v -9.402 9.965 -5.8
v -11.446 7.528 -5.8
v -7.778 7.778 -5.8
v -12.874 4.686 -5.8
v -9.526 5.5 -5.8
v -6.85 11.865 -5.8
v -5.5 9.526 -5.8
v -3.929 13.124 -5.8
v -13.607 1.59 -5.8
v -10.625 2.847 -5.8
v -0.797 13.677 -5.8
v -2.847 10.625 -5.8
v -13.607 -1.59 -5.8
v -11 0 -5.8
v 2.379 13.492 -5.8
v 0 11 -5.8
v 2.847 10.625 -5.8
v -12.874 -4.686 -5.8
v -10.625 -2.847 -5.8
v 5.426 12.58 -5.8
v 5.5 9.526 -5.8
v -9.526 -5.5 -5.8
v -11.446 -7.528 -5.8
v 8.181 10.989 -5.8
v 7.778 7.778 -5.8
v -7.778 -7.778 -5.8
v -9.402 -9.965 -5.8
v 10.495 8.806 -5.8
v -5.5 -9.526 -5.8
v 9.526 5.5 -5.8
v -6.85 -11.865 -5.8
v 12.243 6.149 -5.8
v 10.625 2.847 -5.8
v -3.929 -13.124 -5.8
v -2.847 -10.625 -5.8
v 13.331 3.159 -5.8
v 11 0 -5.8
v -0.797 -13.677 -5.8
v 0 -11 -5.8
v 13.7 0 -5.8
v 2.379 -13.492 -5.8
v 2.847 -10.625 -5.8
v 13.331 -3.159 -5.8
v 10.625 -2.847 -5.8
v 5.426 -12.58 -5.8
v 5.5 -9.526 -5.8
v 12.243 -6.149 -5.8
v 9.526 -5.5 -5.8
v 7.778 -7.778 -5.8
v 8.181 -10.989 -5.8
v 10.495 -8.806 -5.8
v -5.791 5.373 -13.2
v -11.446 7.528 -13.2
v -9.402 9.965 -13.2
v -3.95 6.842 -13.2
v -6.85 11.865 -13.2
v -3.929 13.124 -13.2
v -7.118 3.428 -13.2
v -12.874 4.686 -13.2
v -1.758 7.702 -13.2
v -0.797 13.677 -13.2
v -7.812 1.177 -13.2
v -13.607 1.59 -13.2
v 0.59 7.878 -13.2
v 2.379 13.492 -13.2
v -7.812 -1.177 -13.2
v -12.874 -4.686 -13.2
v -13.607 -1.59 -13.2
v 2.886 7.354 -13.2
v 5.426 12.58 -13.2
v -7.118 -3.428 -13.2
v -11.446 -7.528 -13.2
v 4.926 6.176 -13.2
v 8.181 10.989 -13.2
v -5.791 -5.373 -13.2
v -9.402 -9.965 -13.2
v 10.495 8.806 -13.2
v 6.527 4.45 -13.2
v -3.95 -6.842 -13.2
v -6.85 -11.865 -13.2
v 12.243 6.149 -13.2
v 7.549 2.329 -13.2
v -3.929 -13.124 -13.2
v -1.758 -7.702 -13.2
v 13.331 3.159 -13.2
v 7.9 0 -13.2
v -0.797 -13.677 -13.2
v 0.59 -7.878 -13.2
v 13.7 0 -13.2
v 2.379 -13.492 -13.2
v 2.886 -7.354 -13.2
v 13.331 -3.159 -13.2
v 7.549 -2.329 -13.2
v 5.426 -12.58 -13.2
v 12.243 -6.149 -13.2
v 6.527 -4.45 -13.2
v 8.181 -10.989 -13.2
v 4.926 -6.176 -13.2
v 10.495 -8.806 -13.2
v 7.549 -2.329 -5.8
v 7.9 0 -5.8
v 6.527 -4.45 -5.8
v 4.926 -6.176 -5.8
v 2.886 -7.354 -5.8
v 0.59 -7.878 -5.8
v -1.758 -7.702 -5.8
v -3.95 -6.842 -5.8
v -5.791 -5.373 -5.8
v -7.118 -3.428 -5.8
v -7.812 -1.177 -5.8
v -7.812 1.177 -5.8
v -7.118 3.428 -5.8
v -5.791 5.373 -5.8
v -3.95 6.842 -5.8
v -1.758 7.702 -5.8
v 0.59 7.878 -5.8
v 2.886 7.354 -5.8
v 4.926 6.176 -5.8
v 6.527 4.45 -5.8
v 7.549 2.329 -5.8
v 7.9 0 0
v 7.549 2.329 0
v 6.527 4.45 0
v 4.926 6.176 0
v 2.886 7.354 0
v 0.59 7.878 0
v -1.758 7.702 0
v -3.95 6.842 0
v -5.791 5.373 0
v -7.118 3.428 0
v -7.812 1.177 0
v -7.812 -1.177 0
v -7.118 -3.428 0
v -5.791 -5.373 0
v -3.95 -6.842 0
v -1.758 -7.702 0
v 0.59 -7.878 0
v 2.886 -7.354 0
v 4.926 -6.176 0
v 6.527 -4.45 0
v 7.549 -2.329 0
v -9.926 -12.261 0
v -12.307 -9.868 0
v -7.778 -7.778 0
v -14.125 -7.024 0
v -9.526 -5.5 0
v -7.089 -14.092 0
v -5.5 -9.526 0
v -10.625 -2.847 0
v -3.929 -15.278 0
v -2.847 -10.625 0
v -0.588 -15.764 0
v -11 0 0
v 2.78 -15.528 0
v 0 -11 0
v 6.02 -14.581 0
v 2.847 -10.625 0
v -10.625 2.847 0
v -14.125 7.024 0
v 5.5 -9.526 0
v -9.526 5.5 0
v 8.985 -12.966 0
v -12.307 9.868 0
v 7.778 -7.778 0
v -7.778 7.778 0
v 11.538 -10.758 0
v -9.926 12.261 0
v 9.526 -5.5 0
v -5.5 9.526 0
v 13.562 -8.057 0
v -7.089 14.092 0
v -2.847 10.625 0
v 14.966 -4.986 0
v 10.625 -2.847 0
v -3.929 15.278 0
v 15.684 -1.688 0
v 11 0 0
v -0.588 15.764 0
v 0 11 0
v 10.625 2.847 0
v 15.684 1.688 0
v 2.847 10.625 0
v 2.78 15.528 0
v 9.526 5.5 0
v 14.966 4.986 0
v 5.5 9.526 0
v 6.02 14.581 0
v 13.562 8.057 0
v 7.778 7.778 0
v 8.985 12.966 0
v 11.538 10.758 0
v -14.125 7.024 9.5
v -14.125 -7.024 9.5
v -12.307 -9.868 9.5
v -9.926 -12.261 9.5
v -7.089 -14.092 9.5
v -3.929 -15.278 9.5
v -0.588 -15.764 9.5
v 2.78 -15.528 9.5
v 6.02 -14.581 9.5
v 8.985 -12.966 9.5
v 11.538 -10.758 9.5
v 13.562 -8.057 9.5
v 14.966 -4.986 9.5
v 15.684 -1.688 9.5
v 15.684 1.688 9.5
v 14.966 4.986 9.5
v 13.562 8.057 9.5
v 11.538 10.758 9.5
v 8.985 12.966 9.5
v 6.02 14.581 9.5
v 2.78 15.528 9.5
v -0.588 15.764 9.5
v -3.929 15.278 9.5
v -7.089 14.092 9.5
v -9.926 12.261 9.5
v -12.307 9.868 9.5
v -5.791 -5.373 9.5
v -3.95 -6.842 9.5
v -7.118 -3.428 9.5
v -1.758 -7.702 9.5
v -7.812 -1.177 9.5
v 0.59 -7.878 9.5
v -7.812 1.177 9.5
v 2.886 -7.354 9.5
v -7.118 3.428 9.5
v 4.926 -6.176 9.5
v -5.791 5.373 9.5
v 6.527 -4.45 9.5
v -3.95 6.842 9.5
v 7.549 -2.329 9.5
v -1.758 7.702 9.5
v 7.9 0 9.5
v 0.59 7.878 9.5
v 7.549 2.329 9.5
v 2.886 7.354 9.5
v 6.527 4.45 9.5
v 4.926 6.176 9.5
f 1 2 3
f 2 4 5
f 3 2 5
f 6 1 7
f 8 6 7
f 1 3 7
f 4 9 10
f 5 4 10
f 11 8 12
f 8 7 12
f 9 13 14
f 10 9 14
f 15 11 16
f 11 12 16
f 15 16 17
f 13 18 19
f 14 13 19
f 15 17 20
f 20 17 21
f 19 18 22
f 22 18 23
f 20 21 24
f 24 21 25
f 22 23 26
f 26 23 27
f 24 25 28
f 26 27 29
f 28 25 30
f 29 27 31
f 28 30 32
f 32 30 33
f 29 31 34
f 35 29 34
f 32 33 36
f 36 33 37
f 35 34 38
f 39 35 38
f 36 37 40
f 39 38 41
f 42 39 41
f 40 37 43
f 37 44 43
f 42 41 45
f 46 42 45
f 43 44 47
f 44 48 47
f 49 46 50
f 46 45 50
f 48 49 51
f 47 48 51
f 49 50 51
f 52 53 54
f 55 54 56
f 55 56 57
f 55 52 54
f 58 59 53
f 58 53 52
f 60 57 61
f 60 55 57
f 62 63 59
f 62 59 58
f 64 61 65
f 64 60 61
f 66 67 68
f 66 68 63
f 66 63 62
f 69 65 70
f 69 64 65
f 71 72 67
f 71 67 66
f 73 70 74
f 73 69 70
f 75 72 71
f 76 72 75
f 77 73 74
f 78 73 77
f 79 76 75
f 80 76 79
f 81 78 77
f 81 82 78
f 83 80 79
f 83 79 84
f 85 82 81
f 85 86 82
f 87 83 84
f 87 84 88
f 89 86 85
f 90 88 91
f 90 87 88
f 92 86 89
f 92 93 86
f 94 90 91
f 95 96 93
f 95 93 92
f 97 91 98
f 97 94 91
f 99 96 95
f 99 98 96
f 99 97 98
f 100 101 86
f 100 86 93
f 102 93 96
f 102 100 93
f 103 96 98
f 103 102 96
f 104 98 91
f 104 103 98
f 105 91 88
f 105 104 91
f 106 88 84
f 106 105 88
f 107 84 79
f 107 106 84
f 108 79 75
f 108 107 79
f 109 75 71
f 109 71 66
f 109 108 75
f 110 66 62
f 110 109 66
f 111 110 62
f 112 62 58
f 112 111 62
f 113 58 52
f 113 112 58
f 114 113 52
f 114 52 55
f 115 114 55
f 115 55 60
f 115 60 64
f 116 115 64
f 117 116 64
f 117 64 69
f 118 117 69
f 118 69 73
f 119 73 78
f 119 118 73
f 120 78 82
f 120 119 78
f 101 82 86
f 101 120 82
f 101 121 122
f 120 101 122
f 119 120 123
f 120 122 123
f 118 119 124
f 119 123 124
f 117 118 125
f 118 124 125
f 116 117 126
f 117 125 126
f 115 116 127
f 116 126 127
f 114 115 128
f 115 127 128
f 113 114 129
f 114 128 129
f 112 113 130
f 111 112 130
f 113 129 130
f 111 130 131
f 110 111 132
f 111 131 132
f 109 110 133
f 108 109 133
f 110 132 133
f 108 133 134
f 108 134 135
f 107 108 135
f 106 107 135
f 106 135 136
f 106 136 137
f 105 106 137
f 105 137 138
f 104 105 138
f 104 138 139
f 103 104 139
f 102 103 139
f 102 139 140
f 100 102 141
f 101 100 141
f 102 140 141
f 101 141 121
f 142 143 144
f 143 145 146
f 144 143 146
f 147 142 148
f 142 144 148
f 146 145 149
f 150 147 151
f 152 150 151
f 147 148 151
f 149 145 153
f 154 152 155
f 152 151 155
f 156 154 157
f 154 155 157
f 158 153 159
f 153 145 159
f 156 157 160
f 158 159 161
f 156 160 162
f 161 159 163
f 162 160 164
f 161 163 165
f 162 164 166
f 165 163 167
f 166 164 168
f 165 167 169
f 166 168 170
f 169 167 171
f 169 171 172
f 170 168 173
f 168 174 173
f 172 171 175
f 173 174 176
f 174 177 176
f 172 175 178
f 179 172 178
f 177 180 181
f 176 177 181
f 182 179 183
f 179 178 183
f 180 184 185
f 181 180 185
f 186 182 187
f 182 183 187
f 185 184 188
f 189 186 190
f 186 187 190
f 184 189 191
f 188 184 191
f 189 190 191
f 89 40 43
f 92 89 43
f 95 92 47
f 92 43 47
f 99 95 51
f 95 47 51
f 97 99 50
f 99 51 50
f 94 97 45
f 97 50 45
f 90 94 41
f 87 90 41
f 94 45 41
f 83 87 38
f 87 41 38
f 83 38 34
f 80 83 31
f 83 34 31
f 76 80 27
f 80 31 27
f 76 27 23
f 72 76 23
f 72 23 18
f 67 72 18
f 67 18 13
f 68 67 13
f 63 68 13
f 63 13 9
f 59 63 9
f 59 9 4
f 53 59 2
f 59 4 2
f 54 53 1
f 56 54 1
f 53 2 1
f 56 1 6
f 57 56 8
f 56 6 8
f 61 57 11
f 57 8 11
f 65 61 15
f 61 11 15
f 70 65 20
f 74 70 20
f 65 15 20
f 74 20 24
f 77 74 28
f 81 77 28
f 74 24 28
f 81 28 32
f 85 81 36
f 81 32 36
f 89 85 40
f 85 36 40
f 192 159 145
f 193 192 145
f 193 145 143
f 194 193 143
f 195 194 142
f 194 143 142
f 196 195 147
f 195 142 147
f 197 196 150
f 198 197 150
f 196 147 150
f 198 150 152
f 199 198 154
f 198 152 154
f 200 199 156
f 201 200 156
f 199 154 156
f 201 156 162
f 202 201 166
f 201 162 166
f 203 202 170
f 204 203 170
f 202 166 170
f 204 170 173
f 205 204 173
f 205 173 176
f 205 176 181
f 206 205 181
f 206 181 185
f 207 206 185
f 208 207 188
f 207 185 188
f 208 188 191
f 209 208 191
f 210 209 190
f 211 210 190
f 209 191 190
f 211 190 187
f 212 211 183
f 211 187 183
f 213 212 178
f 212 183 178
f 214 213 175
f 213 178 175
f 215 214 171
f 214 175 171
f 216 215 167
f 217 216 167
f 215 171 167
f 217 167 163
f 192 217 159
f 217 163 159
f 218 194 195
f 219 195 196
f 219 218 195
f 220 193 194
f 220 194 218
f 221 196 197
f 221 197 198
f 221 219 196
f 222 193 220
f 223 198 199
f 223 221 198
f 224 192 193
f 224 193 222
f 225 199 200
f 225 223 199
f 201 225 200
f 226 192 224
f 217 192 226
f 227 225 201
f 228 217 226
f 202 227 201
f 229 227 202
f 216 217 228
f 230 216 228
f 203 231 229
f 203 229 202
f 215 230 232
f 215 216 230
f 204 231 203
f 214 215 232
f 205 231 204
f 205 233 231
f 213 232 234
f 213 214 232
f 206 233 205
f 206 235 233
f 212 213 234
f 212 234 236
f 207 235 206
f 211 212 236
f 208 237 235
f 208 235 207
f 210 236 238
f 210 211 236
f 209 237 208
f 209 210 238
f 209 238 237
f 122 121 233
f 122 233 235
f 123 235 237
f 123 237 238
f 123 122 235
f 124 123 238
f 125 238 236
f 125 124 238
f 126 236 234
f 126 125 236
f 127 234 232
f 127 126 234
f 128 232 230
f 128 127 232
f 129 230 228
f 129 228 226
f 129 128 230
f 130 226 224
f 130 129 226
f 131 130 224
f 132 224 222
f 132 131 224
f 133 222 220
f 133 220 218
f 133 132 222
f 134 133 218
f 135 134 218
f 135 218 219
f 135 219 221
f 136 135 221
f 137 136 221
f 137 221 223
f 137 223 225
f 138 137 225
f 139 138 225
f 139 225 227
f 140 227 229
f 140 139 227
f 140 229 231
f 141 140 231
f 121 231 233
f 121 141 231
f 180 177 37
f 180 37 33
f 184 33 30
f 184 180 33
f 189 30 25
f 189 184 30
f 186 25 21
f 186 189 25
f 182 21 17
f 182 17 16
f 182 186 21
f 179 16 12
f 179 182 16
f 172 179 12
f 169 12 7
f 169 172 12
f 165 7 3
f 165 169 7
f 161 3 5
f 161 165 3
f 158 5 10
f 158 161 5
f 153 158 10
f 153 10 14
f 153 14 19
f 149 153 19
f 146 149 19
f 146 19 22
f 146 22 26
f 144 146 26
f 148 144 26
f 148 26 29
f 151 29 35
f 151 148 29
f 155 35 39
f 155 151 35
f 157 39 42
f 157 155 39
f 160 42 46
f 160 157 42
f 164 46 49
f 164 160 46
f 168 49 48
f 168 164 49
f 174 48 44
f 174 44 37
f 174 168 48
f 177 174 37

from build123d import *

# Parameters (mm, degrees)
F0_R     = 11
F0_R_2   = 7.9
F1_DEPTH = 9.5
F2_DEPTH = 5.8
F3_R     = 13.7
F3_R_2   = 11
F3_R_3   = 7.9
F4_DEPTH = 7.4


with BuildPart() as f1:
    # F0 (on Top) → F1 (new body)
    with BuildSketch(Plane.XY):
        with BuildLine():
            Line((-14.125, 7.0238878123), (-14.125, -7.0238878123))
            ThreePointArc((-14.125, -7.0238878123), (15.775, 0), (-14.125, 7.0238878123))
        make_face()
        Circle(F0_R, mode=Mode.SUBTRACT)
        Circle(F0_R)
        Circle(F0_R_2, mode=Mode.SUBTRACT)
    extrude(amount=F1_DEPTH)

    # F0 (on Top) → F2 (join)
    with BuildSketch(Plane.XY):
        Circle(F0_R)
        Circle(F0_R_2, mode=Mode.SUBTRACT)
    extrude(amount=-F2_DEPTH)

    # F3 (on face) → F4 (join)
    with BuildSketch(Plane(origin=(0, 0, -5.8), x_dir=(1, 0, 0), z_dir=(0, 0, -1))):
        Circle(F3_R)
        Circle(F3_R_2, mode=Mode.SUBTRACT)
        Circle(F3_R_2)
        Circle(F3_R_3, mode=Mode.SUBTRACT)
    extrude(amount=F4_DEPTH)


solid = f1.part
